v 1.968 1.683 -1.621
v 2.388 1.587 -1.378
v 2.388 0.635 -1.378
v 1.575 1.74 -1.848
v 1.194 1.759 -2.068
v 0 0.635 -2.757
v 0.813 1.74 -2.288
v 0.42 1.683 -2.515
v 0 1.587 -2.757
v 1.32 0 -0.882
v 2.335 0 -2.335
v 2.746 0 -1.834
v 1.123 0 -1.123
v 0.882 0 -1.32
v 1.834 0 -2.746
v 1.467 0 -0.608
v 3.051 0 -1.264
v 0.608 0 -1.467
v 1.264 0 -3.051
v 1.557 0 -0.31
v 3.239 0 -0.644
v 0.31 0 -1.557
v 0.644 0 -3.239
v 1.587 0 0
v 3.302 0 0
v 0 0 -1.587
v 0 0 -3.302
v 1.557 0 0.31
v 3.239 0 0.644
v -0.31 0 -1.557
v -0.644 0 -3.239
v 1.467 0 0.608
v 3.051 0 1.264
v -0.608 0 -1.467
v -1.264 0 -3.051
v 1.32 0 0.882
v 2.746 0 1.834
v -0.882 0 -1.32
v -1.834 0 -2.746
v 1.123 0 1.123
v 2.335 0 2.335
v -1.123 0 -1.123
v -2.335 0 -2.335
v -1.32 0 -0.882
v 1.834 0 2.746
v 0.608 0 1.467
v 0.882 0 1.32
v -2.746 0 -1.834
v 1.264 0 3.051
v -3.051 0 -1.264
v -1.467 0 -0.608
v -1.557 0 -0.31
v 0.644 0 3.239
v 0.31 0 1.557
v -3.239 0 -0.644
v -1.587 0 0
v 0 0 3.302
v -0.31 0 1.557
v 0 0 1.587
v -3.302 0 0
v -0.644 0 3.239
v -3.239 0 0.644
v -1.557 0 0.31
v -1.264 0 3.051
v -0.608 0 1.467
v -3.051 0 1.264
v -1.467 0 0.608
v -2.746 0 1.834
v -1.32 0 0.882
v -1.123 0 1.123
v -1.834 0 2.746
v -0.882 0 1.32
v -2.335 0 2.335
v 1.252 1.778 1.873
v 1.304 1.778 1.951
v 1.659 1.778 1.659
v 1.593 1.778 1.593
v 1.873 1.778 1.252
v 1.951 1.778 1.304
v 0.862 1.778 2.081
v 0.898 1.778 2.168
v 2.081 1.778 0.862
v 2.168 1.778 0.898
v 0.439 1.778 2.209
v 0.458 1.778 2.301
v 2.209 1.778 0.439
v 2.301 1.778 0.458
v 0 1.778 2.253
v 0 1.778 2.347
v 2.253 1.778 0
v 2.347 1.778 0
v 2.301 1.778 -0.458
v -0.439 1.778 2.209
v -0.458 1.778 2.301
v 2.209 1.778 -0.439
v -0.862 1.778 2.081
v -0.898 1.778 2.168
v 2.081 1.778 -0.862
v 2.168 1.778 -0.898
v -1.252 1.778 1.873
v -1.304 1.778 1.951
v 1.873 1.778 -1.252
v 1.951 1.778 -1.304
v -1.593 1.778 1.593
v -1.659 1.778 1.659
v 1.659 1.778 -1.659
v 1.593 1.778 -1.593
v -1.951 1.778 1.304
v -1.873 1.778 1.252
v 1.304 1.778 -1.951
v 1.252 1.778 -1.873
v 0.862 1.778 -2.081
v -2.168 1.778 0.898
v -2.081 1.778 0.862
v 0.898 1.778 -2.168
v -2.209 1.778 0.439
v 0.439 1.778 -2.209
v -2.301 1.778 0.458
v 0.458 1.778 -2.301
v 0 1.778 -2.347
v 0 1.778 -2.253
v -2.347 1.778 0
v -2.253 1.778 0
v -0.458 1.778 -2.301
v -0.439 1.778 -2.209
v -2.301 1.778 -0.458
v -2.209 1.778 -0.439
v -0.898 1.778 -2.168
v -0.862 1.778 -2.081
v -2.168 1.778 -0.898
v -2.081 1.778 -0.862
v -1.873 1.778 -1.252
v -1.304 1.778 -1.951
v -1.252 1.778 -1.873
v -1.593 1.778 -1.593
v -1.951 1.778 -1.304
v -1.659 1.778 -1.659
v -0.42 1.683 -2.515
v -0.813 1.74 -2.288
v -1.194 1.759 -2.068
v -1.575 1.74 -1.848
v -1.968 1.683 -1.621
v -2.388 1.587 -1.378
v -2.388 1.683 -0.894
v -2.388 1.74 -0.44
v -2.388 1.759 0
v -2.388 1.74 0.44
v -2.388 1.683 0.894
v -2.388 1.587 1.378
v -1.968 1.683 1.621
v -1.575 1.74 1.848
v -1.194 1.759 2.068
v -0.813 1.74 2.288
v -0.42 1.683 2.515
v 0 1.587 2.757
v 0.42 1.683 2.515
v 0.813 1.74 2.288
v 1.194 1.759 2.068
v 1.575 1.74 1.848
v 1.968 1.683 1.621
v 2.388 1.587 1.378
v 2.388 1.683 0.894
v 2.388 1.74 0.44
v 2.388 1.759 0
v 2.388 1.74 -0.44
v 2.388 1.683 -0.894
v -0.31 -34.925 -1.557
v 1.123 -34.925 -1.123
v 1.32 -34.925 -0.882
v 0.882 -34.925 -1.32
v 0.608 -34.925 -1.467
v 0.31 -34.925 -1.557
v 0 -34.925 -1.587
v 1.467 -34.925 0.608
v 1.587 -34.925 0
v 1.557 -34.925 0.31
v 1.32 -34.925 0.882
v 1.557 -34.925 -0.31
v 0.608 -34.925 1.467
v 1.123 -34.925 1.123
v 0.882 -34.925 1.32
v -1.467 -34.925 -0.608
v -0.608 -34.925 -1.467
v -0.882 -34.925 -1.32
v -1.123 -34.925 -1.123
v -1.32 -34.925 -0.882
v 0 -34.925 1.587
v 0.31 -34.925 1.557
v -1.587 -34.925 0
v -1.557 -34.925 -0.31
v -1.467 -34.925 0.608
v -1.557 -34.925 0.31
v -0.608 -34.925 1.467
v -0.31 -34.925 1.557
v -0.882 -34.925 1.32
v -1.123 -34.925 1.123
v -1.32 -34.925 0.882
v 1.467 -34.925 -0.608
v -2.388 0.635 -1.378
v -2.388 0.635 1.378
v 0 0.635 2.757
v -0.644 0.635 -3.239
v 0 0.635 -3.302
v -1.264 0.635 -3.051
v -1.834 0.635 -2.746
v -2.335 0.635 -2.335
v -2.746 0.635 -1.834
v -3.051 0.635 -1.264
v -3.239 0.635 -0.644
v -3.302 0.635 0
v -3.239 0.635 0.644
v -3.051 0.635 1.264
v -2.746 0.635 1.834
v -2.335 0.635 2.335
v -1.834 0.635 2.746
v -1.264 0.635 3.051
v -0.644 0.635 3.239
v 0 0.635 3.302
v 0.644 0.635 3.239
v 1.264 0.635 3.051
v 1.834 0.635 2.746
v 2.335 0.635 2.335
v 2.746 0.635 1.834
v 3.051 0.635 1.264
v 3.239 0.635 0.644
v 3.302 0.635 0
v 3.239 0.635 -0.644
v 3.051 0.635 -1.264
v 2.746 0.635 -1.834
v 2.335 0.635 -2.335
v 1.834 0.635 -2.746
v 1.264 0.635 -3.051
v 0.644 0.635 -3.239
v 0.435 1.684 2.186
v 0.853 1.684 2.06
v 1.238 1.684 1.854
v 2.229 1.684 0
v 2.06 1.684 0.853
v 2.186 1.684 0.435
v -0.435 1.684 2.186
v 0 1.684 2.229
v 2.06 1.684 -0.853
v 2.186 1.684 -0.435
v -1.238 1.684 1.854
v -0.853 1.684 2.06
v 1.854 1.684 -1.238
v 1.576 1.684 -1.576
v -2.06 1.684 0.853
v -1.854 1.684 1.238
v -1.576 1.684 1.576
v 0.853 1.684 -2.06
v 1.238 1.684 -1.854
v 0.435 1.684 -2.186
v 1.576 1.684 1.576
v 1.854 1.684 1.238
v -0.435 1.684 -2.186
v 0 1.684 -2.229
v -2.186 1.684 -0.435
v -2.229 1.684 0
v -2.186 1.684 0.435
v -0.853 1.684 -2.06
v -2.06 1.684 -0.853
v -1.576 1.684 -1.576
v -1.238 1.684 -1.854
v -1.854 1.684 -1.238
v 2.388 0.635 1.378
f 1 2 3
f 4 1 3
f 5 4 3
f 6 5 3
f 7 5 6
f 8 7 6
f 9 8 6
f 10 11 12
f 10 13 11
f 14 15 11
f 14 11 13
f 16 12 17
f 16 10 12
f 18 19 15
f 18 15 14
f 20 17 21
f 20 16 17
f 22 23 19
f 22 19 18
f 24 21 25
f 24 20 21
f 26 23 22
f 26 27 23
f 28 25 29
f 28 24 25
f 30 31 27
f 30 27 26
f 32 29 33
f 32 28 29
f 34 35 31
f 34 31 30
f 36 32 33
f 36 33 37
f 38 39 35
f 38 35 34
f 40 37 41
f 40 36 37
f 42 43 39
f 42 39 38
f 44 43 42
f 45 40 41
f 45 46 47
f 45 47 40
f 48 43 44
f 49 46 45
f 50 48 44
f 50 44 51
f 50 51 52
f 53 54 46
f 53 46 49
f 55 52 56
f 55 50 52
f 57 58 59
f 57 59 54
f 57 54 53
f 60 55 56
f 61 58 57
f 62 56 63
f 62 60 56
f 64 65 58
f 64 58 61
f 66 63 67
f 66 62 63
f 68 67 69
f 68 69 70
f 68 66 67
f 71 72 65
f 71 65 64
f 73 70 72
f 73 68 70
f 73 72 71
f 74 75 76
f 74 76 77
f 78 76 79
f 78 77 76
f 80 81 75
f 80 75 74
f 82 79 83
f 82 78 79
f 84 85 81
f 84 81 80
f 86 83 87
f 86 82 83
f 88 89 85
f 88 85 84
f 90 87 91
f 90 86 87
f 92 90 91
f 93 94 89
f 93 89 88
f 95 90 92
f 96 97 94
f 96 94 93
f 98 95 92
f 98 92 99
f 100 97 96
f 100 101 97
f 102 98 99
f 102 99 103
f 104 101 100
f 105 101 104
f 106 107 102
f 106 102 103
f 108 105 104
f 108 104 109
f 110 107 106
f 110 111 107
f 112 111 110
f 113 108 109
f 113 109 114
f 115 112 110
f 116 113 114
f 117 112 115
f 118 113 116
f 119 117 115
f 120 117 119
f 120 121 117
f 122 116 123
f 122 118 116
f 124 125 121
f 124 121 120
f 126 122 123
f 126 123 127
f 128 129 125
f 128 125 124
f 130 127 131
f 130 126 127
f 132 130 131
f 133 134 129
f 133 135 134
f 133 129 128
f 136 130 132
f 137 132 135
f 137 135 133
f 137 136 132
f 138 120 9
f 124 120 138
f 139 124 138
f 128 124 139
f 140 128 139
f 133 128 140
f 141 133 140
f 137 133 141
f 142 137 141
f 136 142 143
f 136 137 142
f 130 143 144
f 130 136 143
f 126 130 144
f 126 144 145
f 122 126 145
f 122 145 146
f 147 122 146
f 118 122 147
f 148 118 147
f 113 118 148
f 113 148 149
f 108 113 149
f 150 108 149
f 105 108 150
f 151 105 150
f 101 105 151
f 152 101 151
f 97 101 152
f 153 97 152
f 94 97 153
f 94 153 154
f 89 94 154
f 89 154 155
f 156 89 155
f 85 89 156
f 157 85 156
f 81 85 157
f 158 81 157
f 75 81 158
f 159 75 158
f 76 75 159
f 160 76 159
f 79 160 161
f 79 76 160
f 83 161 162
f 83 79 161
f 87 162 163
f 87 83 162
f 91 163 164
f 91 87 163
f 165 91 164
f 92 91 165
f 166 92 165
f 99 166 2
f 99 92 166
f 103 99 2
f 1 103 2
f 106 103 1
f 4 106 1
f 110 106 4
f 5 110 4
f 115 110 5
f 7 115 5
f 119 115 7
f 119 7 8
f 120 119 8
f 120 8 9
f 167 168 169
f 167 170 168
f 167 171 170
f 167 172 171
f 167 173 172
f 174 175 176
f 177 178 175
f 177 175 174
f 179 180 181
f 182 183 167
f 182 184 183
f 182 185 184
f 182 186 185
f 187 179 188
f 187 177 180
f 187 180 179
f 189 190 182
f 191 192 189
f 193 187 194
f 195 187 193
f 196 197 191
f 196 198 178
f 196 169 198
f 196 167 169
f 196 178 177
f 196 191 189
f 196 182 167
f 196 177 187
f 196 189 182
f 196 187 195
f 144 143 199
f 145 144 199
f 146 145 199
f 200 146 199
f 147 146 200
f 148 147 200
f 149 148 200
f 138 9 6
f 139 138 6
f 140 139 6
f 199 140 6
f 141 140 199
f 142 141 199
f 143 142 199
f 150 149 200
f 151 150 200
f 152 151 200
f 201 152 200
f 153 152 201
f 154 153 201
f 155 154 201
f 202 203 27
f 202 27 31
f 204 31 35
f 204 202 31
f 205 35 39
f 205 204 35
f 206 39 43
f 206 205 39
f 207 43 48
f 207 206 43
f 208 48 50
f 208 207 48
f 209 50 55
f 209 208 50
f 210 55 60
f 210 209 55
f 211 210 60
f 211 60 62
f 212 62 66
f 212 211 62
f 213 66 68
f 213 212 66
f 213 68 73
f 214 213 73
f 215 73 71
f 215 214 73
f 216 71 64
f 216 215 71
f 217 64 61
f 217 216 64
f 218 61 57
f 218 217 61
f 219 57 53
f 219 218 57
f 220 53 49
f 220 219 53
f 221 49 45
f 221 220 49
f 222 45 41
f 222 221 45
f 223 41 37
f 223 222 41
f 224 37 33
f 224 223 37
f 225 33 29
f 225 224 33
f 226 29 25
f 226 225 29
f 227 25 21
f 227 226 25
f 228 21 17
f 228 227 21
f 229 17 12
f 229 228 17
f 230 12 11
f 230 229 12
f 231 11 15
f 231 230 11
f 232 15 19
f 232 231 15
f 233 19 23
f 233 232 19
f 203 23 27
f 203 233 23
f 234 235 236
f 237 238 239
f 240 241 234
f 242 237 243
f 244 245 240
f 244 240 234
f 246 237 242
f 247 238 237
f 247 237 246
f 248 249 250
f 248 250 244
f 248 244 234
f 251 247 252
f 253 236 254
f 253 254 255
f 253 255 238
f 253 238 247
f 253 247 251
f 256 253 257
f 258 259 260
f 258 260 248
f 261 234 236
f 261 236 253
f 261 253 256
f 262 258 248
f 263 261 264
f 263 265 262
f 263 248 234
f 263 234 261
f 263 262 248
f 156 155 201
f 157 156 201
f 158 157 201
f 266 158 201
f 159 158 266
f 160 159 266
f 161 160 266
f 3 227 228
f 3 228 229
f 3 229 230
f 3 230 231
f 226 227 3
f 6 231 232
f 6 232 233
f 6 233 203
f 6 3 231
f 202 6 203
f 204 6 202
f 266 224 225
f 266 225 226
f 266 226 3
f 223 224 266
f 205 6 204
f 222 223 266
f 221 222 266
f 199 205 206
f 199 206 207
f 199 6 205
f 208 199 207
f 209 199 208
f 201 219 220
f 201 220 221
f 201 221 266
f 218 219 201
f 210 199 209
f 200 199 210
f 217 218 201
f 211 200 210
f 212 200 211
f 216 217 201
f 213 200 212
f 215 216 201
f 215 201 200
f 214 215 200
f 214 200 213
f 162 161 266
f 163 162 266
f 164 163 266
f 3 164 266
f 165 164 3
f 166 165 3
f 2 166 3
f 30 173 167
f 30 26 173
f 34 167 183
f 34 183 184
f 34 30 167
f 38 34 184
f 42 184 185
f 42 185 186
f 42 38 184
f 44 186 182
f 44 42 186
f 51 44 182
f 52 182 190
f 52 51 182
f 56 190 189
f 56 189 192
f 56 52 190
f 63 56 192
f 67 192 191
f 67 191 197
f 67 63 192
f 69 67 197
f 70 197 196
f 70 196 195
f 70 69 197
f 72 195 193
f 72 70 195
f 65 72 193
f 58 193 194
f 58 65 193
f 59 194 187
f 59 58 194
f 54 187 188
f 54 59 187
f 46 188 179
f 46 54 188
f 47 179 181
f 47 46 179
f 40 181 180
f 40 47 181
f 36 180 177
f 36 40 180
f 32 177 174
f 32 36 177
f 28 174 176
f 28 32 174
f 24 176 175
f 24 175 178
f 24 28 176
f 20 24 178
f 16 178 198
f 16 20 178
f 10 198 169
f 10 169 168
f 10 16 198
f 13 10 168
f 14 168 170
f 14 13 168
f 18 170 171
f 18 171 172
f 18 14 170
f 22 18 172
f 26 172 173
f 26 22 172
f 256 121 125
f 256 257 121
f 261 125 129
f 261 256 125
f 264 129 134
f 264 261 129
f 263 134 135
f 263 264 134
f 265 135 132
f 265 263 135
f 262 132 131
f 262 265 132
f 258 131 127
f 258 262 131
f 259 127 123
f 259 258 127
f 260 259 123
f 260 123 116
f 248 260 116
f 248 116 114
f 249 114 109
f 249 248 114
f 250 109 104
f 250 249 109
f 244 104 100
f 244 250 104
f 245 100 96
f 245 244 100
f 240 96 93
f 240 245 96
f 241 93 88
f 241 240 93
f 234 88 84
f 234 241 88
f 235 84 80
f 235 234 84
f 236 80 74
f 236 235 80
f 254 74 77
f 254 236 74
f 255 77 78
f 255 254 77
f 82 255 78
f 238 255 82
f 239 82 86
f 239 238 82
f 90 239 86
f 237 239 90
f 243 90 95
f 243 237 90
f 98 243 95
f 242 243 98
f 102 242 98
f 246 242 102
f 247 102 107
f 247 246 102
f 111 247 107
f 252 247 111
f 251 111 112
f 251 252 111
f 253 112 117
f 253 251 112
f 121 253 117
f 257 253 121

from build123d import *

# Parameters (mm, degrees)
SKETCH2_W          = 1.587498625
SKETCH2_H          = 34.925
SKETCH3_W          = 7.264393708
SKETCH3_H          = 7.264393708
CUT_EXTRUDE1_DEPTH = 1.14299901


with BuildPart() as part:
    # Sketch1 → Base-Revolve (revolve)
    with BuildSketch(Plane.XY, mode=Mode.PRIVATE) as base_revolve_sk:
        Polygon((0, 0), (3.30199714, 0), (3.30199714, 1.332469781), (2.346557647, 1.77799846), (2.252695341, 1.77799846), (2.229229765, 1.684136154), (0, 1.684136154), align=None)
    revolve(base_revolve_sk.sketch.rotate(Axis((0, 0, 0), (0, 1, 0)), 90), axis=Axis((0, 0, 0), (0, 1, 0)))

    # Sketch2 → Boss-Revolve1 (revolve)
    with BuildSketch(Plane.XY, mode=Mode.PRIVATE) as boss_revolve1_sk:
        with Locations((0.793749313, -17.4625)):
            Rectangle(SKETCH2_W, SKETCH2_H)
    revolve(boss_revolve1_sk.sketch.rotate(Axis((0, 0, 0), (0, 1, 0)), 90), axis=Axis((0, 0, 0), (0, 1, 0)))

    # Sketch3 → Cut-Extrude1 (cut)
    with BuildSketch(Plane(origin=(0, 1.77799846, 0), x_dir=(-1, 0, 0), z_dir=(0, 1, 0))):
        Rectangle(SKETCH3_W, SKETCH3_H)
        Polygon((2.387597932, 1.378480068), (6.25e-07, 2.756960497), (-2.387597307, 1.378481151), (-2.387598557, -1.378478985), (-1.876e-06, -2.756960497), (2.387596681, -1.378482234), align=None, mode=Mode.SUBTRACT)
    extrude(amount=-CUT_EXTRUDE1_DEPTH, mode=Mode.SUBTRACT)


solid = part.part
